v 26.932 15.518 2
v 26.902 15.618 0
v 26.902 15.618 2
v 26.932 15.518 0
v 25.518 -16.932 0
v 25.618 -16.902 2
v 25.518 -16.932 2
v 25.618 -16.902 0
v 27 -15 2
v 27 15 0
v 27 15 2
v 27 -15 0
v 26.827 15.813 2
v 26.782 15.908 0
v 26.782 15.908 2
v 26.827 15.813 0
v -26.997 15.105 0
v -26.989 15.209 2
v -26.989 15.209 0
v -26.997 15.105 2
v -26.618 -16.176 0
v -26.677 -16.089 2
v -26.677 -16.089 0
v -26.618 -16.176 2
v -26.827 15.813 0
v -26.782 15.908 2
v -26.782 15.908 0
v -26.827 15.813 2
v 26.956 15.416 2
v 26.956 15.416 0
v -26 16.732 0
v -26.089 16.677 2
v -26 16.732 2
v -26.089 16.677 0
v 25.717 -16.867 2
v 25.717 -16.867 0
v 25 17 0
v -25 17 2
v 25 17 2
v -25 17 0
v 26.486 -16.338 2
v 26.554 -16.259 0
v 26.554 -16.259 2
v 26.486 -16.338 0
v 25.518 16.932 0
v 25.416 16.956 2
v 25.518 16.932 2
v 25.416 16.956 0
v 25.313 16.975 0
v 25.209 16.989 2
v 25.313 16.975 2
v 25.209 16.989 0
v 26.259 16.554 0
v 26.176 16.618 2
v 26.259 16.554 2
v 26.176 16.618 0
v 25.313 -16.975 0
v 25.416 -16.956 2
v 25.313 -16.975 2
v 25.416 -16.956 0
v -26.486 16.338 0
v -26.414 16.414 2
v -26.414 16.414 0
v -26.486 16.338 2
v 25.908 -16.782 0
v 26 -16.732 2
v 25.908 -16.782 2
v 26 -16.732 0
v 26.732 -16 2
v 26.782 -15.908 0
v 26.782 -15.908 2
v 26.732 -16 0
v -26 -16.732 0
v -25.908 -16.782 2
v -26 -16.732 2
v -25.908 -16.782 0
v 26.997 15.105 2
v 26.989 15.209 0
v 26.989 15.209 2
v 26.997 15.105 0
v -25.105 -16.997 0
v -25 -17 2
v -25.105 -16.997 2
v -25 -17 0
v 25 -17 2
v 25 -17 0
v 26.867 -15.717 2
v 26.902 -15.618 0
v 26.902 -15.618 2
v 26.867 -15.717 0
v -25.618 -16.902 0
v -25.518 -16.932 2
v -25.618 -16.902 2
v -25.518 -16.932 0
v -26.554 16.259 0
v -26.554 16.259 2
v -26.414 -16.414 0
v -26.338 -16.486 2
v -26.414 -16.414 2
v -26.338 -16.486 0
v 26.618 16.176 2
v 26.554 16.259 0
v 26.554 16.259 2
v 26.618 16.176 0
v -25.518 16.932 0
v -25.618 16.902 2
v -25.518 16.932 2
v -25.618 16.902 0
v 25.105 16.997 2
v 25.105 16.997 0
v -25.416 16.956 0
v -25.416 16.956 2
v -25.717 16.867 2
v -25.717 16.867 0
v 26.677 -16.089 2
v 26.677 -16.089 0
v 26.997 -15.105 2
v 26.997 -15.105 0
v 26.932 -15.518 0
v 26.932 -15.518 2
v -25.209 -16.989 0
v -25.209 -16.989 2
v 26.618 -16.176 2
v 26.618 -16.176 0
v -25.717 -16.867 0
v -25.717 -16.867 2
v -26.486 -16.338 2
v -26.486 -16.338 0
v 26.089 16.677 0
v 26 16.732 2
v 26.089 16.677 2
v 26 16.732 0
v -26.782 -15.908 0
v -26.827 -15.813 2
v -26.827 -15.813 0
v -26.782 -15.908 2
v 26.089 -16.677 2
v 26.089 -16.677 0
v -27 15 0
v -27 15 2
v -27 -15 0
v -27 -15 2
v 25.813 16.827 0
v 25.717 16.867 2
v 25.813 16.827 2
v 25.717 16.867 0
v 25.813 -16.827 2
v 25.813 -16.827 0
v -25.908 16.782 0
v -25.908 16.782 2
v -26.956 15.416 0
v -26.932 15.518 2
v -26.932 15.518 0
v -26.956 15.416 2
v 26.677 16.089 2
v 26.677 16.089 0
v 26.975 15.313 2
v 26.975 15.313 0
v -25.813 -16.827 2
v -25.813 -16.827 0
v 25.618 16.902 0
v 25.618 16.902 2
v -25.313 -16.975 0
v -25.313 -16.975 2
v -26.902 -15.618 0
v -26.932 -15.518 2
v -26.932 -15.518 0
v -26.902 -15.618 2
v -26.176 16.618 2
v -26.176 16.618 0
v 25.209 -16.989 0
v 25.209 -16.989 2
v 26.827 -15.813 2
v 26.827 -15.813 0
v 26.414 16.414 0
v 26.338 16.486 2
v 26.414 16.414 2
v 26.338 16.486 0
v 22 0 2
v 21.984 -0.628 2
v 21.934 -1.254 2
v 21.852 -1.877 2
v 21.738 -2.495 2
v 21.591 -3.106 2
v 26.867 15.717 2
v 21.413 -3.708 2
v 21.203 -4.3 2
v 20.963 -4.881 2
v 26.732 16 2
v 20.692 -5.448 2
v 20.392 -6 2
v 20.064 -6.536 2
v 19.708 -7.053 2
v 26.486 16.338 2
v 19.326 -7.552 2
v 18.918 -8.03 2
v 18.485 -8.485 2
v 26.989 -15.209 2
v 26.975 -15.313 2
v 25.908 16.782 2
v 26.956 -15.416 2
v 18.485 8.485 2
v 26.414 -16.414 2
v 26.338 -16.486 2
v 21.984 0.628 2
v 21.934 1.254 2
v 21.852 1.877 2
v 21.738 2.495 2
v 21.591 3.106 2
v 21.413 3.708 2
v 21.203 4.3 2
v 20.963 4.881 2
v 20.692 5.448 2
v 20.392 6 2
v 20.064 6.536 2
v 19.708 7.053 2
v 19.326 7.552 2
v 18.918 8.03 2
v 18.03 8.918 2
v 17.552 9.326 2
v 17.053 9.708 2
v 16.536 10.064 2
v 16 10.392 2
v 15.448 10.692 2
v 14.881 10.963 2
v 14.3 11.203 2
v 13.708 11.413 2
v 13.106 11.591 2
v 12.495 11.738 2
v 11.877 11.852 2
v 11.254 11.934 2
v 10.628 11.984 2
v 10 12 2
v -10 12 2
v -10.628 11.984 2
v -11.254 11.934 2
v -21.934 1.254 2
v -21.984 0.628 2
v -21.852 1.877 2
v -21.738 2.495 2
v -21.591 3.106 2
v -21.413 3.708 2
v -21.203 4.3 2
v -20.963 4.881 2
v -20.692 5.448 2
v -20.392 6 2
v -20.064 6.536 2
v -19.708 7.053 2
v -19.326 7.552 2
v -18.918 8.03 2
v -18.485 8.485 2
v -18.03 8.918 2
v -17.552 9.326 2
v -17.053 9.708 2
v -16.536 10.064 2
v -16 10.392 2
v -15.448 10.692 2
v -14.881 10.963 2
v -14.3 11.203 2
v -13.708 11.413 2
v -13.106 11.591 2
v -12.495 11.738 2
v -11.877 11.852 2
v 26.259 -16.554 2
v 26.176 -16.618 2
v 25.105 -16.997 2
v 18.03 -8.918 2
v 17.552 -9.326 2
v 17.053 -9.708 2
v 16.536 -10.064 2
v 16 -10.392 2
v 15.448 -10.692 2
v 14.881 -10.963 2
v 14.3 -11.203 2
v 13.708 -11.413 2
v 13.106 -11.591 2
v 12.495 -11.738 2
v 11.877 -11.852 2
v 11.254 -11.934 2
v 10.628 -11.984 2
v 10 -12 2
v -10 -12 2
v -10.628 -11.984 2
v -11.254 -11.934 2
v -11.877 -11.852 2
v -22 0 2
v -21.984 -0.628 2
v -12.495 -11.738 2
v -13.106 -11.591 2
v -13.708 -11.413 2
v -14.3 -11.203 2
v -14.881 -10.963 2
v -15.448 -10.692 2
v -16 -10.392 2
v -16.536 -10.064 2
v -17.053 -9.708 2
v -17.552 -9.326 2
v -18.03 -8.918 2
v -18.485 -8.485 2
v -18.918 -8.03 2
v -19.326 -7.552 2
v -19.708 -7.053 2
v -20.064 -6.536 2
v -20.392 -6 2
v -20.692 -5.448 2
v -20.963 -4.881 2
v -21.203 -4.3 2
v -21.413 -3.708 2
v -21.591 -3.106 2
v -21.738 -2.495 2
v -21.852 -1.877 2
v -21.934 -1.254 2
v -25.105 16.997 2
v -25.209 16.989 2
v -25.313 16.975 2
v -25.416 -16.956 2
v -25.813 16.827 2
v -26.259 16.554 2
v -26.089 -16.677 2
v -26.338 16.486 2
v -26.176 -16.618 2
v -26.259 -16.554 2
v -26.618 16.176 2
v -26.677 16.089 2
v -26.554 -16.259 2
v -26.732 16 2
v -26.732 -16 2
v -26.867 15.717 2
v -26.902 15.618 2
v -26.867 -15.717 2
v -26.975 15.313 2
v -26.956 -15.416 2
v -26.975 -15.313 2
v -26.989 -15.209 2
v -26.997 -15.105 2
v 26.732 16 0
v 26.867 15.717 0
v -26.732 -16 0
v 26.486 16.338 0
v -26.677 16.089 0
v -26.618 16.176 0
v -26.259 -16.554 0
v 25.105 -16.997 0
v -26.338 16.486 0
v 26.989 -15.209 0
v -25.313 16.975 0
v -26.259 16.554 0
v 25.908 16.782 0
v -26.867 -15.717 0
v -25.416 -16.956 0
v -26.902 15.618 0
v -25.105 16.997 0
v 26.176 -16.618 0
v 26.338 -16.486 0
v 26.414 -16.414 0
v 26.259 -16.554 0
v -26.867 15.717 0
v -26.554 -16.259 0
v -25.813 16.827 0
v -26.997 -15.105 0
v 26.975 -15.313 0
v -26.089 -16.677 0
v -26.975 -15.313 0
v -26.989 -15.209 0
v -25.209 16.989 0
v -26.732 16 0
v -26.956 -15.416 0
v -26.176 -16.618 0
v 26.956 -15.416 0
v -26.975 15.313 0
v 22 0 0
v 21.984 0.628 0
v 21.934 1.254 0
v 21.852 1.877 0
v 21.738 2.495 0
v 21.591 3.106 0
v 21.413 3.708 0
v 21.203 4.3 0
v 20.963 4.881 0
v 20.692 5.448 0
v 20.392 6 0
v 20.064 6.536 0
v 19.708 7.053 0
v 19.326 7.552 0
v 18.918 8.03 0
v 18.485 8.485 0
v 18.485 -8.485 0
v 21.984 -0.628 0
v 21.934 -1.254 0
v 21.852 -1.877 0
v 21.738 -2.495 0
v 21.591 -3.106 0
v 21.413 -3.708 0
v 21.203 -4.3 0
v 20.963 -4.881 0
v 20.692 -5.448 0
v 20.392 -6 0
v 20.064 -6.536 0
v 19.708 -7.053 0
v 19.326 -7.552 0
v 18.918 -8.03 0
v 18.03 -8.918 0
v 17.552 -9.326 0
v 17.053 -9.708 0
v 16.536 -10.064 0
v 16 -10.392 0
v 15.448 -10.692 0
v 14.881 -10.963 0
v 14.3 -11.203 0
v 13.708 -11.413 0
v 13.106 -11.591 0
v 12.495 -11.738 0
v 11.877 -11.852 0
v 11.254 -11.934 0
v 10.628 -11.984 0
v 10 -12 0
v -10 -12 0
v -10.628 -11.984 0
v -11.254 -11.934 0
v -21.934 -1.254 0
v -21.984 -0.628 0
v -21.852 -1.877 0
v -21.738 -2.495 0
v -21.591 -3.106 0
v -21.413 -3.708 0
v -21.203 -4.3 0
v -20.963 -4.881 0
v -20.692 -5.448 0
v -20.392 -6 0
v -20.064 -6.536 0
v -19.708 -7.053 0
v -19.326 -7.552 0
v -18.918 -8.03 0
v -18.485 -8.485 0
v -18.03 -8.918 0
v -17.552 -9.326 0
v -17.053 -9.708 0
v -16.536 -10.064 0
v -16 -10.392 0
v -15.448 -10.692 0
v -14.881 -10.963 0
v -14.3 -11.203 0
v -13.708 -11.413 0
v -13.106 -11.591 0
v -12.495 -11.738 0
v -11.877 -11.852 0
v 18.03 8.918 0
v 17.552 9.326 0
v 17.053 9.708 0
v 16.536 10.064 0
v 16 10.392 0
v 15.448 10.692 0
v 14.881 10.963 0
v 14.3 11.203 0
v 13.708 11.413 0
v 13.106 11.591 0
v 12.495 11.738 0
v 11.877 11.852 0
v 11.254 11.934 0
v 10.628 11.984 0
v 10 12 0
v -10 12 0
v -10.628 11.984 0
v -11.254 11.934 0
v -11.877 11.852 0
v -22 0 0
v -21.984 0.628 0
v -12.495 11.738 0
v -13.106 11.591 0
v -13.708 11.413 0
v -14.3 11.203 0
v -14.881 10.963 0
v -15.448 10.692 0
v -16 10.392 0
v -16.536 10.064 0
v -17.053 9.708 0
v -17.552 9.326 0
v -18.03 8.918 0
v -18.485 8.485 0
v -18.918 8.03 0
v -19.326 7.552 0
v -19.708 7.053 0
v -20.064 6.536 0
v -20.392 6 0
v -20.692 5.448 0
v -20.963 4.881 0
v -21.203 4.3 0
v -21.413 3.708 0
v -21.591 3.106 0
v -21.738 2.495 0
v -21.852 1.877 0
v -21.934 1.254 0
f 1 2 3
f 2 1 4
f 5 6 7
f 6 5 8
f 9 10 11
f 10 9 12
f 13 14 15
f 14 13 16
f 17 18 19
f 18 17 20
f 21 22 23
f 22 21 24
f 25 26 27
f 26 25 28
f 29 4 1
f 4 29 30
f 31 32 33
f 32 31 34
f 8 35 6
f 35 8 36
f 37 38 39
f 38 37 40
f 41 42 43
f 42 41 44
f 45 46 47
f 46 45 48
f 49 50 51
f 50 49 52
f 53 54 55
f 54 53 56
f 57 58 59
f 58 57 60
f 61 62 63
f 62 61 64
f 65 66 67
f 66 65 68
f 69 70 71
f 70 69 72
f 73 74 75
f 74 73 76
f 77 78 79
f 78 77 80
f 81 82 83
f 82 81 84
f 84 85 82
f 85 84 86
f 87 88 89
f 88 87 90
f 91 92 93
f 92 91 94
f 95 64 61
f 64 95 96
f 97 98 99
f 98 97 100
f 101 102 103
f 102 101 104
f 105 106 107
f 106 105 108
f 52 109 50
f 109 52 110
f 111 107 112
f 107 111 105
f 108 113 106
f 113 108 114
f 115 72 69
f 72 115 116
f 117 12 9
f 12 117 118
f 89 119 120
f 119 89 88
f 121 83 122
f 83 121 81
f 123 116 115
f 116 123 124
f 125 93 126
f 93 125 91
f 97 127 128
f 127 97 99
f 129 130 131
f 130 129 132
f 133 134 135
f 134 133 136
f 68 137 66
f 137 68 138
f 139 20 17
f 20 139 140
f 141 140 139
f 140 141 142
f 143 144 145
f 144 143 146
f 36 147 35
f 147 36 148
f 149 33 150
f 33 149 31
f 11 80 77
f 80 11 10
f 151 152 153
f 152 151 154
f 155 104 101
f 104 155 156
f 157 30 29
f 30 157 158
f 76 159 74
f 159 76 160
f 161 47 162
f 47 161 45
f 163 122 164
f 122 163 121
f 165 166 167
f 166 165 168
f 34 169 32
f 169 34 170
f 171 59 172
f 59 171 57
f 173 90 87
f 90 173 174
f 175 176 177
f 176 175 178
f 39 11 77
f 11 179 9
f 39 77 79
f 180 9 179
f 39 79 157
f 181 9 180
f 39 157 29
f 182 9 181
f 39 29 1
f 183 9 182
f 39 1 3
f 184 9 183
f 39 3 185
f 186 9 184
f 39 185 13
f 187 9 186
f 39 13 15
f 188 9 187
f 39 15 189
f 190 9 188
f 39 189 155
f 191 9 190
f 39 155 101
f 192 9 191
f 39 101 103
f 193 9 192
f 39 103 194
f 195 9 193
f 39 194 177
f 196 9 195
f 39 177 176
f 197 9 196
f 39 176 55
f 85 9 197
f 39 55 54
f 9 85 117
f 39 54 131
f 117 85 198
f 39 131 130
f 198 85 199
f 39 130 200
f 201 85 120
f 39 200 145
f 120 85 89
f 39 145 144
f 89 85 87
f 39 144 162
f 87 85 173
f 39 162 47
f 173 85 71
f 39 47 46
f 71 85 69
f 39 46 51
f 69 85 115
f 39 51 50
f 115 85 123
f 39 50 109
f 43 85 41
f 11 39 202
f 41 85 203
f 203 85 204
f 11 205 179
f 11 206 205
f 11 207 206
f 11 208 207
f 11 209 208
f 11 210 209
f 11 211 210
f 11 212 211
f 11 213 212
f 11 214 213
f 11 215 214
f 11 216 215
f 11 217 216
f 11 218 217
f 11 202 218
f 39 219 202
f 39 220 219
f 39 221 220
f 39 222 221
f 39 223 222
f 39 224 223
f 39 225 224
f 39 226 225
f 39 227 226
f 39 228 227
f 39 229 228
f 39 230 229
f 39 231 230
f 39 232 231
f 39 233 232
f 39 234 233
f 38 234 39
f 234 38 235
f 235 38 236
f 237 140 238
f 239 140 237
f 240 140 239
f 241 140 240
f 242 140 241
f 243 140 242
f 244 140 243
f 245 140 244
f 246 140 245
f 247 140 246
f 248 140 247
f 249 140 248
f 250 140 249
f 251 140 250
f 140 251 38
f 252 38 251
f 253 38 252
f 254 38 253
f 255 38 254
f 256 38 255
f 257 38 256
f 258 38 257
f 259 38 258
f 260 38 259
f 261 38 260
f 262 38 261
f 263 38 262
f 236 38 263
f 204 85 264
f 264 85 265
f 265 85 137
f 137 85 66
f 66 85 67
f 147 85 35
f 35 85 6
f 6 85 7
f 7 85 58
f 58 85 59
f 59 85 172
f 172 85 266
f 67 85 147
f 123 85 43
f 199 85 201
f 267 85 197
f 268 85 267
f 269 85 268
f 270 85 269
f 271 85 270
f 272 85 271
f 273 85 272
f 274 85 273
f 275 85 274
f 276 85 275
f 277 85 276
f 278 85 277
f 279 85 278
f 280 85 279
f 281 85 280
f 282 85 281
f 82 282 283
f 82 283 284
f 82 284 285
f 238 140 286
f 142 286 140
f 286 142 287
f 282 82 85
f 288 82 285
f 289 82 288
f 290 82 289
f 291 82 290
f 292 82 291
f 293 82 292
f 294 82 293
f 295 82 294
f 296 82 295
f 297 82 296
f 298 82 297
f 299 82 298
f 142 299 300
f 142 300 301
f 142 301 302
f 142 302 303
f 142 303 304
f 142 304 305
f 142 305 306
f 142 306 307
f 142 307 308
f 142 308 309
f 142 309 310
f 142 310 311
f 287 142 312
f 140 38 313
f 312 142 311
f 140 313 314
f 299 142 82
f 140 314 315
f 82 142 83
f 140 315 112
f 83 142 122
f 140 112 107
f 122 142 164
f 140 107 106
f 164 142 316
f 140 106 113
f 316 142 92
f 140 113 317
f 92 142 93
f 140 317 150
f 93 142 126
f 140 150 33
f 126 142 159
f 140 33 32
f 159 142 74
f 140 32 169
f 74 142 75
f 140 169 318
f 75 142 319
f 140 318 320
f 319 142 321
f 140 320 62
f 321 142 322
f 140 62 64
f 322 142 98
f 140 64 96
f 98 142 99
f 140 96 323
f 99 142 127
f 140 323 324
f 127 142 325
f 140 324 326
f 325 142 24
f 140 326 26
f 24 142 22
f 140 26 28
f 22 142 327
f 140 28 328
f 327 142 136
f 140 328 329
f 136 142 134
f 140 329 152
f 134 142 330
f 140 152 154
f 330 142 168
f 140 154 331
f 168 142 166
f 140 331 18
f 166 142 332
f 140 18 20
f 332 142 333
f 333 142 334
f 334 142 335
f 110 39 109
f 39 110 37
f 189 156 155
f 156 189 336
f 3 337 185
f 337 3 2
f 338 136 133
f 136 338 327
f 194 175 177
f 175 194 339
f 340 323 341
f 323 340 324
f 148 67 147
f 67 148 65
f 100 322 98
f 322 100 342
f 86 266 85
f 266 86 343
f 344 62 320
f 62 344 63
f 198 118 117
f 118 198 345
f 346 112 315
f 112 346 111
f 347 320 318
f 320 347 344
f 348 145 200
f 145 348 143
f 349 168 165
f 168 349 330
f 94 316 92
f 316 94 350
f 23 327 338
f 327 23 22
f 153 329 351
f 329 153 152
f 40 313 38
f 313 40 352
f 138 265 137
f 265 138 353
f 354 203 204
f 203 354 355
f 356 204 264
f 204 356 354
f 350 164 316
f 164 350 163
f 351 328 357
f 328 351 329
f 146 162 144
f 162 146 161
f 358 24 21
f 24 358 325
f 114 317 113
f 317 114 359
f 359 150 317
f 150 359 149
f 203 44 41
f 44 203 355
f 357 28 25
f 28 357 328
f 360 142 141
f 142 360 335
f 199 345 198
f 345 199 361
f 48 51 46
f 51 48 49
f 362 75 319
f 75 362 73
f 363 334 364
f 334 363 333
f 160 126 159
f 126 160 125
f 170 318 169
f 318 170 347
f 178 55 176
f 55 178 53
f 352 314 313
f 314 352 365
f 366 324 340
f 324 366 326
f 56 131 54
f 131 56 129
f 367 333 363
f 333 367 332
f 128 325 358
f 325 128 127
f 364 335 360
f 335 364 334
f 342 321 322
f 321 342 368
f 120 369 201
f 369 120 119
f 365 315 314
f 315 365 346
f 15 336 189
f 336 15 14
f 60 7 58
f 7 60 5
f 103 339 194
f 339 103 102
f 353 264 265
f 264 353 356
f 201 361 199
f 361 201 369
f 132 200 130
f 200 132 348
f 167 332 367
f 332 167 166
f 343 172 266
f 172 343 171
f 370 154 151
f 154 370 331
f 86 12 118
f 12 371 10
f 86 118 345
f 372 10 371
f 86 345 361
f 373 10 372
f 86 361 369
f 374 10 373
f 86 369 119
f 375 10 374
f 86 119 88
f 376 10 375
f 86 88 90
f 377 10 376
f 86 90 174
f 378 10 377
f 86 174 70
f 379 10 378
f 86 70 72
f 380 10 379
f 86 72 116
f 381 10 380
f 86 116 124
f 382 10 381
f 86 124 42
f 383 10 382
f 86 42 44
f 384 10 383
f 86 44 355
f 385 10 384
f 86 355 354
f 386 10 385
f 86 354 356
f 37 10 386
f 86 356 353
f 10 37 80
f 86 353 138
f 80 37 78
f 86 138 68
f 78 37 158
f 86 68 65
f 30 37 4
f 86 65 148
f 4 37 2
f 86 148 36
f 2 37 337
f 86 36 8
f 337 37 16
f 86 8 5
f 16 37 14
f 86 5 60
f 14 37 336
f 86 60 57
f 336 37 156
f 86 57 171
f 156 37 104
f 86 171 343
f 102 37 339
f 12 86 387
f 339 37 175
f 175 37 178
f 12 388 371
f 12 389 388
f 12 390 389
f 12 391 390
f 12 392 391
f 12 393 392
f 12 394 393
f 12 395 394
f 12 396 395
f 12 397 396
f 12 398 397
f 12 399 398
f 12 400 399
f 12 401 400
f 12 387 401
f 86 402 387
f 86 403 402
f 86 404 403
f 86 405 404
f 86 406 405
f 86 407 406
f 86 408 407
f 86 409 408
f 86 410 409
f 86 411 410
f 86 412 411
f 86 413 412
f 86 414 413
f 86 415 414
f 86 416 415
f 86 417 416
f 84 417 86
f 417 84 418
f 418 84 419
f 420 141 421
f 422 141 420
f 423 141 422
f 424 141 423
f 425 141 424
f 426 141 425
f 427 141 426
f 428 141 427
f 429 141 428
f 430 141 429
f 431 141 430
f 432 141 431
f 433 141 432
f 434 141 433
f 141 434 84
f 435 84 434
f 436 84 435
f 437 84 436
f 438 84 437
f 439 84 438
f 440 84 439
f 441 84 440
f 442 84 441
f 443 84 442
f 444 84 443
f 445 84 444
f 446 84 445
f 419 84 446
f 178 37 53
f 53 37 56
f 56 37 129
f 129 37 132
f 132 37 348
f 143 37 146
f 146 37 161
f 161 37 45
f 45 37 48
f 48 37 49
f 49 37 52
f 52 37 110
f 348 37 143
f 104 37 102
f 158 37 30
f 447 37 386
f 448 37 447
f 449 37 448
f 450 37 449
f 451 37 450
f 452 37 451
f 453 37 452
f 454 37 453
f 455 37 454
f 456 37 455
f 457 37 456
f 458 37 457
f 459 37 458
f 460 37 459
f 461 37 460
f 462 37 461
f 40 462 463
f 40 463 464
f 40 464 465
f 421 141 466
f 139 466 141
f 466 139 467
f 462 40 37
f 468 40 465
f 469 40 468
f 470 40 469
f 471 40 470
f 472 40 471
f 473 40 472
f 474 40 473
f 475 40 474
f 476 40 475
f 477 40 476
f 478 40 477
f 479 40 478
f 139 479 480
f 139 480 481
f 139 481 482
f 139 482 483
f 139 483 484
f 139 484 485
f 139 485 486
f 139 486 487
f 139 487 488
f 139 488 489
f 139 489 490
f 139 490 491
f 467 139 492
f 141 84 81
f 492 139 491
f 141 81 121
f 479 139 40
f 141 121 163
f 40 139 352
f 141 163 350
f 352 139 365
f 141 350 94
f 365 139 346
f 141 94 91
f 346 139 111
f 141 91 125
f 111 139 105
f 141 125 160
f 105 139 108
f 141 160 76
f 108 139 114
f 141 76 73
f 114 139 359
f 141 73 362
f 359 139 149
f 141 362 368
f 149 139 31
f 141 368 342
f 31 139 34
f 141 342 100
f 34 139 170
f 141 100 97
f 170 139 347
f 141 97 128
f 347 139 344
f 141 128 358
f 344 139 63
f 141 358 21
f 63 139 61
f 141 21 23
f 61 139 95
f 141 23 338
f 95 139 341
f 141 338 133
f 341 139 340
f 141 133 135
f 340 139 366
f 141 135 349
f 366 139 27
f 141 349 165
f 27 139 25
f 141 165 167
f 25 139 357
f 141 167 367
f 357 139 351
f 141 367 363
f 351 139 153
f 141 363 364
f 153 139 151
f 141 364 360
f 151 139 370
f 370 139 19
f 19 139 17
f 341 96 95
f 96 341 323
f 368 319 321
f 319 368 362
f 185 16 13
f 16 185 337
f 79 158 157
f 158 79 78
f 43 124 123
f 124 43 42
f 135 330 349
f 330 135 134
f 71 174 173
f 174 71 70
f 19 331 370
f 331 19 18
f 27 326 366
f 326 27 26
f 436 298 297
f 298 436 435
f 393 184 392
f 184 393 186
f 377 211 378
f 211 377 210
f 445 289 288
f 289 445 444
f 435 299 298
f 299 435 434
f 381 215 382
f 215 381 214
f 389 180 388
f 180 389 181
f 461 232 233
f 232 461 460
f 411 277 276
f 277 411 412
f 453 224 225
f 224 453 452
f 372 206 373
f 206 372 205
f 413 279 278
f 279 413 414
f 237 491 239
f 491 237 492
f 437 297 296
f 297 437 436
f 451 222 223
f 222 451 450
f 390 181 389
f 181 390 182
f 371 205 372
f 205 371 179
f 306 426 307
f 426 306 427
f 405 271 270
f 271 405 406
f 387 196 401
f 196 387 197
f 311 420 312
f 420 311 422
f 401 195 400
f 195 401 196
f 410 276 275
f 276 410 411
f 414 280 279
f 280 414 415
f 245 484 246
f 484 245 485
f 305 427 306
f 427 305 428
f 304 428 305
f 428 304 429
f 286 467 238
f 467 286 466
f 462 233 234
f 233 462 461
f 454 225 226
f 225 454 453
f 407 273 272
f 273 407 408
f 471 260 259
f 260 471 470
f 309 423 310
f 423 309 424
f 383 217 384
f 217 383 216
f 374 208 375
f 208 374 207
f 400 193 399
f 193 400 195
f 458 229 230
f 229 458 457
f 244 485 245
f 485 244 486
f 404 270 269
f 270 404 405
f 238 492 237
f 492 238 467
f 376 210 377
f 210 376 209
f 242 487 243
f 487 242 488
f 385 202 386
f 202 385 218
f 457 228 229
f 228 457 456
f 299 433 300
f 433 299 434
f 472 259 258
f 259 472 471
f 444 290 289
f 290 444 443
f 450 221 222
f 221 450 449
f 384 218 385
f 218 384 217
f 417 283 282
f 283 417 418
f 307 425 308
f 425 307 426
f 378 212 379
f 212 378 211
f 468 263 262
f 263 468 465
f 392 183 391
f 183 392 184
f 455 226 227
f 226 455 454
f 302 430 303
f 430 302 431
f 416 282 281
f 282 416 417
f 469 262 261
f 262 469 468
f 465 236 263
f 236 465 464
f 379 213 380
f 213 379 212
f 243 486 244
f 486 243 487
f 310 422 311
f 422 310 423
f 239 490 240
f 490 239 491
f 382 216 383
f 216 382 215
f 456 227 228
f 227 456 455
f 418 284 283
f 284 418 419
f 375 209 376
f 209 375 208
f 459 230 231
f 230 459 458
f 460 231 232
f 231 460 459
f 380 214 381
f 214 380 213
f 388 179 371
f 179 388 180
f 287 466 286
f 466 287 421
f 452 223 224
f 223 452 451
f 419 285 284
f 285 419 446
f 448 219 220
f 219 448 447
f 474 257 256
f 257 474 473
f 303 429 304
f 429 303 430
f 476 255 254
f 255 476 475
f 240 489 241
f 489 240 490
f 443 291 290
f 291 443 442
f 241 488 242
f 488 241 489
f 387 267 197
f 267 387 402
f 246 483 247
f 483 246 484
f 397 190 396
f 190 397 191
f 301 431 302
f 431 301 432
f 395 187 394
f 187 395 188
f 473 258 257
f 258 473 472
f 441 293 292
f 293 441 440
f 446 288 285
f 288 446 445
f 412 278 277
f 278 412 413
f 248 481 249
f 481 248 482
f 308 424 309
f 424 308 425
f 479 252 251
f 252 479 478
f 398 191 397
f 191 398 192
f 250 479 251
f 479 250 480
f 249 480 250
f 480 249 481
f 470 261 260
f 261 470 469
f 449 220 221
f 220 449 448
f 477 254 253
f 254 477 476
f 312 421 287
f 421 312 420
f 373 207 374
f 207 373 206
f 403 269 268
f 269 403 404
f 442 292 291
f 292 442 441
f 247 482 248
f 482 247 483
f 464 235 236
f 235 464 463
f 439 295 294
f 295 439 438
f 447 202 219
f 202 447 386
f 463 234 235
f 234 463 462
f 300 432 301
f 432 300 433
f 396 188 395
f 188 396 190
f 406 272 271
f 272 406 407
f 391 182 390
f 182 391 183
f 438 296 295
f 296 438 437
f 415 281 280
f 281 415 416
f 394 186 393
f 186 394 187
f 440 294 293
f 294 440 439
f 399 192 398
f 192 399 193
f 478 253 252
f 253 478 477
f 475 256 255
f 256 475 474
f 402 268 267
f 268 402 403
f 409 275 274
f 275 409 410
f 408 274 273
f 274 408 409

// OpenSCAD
$fn=120;

height=2;

difference() {
	hull() {
		translate([-25,-15,0]) { cylinder (r=2, h=height); }
		translate([ 25,-15,0]) { cylinder (r=2, h=height); }
		translate([ 25, 15,0]) { cylinder (r=2, h=height); }
		translate([-25, 15,0]) { cylinder (r=2, h=height); }
	}
	translate([0,0,-1]) {
		hull() {
			translate([-10,0,0]) { cylinder(r=12, h=height+2); }
			translate([10,0,0])  { cylinder(r=12, h=height+2); }
		}
	}
}
